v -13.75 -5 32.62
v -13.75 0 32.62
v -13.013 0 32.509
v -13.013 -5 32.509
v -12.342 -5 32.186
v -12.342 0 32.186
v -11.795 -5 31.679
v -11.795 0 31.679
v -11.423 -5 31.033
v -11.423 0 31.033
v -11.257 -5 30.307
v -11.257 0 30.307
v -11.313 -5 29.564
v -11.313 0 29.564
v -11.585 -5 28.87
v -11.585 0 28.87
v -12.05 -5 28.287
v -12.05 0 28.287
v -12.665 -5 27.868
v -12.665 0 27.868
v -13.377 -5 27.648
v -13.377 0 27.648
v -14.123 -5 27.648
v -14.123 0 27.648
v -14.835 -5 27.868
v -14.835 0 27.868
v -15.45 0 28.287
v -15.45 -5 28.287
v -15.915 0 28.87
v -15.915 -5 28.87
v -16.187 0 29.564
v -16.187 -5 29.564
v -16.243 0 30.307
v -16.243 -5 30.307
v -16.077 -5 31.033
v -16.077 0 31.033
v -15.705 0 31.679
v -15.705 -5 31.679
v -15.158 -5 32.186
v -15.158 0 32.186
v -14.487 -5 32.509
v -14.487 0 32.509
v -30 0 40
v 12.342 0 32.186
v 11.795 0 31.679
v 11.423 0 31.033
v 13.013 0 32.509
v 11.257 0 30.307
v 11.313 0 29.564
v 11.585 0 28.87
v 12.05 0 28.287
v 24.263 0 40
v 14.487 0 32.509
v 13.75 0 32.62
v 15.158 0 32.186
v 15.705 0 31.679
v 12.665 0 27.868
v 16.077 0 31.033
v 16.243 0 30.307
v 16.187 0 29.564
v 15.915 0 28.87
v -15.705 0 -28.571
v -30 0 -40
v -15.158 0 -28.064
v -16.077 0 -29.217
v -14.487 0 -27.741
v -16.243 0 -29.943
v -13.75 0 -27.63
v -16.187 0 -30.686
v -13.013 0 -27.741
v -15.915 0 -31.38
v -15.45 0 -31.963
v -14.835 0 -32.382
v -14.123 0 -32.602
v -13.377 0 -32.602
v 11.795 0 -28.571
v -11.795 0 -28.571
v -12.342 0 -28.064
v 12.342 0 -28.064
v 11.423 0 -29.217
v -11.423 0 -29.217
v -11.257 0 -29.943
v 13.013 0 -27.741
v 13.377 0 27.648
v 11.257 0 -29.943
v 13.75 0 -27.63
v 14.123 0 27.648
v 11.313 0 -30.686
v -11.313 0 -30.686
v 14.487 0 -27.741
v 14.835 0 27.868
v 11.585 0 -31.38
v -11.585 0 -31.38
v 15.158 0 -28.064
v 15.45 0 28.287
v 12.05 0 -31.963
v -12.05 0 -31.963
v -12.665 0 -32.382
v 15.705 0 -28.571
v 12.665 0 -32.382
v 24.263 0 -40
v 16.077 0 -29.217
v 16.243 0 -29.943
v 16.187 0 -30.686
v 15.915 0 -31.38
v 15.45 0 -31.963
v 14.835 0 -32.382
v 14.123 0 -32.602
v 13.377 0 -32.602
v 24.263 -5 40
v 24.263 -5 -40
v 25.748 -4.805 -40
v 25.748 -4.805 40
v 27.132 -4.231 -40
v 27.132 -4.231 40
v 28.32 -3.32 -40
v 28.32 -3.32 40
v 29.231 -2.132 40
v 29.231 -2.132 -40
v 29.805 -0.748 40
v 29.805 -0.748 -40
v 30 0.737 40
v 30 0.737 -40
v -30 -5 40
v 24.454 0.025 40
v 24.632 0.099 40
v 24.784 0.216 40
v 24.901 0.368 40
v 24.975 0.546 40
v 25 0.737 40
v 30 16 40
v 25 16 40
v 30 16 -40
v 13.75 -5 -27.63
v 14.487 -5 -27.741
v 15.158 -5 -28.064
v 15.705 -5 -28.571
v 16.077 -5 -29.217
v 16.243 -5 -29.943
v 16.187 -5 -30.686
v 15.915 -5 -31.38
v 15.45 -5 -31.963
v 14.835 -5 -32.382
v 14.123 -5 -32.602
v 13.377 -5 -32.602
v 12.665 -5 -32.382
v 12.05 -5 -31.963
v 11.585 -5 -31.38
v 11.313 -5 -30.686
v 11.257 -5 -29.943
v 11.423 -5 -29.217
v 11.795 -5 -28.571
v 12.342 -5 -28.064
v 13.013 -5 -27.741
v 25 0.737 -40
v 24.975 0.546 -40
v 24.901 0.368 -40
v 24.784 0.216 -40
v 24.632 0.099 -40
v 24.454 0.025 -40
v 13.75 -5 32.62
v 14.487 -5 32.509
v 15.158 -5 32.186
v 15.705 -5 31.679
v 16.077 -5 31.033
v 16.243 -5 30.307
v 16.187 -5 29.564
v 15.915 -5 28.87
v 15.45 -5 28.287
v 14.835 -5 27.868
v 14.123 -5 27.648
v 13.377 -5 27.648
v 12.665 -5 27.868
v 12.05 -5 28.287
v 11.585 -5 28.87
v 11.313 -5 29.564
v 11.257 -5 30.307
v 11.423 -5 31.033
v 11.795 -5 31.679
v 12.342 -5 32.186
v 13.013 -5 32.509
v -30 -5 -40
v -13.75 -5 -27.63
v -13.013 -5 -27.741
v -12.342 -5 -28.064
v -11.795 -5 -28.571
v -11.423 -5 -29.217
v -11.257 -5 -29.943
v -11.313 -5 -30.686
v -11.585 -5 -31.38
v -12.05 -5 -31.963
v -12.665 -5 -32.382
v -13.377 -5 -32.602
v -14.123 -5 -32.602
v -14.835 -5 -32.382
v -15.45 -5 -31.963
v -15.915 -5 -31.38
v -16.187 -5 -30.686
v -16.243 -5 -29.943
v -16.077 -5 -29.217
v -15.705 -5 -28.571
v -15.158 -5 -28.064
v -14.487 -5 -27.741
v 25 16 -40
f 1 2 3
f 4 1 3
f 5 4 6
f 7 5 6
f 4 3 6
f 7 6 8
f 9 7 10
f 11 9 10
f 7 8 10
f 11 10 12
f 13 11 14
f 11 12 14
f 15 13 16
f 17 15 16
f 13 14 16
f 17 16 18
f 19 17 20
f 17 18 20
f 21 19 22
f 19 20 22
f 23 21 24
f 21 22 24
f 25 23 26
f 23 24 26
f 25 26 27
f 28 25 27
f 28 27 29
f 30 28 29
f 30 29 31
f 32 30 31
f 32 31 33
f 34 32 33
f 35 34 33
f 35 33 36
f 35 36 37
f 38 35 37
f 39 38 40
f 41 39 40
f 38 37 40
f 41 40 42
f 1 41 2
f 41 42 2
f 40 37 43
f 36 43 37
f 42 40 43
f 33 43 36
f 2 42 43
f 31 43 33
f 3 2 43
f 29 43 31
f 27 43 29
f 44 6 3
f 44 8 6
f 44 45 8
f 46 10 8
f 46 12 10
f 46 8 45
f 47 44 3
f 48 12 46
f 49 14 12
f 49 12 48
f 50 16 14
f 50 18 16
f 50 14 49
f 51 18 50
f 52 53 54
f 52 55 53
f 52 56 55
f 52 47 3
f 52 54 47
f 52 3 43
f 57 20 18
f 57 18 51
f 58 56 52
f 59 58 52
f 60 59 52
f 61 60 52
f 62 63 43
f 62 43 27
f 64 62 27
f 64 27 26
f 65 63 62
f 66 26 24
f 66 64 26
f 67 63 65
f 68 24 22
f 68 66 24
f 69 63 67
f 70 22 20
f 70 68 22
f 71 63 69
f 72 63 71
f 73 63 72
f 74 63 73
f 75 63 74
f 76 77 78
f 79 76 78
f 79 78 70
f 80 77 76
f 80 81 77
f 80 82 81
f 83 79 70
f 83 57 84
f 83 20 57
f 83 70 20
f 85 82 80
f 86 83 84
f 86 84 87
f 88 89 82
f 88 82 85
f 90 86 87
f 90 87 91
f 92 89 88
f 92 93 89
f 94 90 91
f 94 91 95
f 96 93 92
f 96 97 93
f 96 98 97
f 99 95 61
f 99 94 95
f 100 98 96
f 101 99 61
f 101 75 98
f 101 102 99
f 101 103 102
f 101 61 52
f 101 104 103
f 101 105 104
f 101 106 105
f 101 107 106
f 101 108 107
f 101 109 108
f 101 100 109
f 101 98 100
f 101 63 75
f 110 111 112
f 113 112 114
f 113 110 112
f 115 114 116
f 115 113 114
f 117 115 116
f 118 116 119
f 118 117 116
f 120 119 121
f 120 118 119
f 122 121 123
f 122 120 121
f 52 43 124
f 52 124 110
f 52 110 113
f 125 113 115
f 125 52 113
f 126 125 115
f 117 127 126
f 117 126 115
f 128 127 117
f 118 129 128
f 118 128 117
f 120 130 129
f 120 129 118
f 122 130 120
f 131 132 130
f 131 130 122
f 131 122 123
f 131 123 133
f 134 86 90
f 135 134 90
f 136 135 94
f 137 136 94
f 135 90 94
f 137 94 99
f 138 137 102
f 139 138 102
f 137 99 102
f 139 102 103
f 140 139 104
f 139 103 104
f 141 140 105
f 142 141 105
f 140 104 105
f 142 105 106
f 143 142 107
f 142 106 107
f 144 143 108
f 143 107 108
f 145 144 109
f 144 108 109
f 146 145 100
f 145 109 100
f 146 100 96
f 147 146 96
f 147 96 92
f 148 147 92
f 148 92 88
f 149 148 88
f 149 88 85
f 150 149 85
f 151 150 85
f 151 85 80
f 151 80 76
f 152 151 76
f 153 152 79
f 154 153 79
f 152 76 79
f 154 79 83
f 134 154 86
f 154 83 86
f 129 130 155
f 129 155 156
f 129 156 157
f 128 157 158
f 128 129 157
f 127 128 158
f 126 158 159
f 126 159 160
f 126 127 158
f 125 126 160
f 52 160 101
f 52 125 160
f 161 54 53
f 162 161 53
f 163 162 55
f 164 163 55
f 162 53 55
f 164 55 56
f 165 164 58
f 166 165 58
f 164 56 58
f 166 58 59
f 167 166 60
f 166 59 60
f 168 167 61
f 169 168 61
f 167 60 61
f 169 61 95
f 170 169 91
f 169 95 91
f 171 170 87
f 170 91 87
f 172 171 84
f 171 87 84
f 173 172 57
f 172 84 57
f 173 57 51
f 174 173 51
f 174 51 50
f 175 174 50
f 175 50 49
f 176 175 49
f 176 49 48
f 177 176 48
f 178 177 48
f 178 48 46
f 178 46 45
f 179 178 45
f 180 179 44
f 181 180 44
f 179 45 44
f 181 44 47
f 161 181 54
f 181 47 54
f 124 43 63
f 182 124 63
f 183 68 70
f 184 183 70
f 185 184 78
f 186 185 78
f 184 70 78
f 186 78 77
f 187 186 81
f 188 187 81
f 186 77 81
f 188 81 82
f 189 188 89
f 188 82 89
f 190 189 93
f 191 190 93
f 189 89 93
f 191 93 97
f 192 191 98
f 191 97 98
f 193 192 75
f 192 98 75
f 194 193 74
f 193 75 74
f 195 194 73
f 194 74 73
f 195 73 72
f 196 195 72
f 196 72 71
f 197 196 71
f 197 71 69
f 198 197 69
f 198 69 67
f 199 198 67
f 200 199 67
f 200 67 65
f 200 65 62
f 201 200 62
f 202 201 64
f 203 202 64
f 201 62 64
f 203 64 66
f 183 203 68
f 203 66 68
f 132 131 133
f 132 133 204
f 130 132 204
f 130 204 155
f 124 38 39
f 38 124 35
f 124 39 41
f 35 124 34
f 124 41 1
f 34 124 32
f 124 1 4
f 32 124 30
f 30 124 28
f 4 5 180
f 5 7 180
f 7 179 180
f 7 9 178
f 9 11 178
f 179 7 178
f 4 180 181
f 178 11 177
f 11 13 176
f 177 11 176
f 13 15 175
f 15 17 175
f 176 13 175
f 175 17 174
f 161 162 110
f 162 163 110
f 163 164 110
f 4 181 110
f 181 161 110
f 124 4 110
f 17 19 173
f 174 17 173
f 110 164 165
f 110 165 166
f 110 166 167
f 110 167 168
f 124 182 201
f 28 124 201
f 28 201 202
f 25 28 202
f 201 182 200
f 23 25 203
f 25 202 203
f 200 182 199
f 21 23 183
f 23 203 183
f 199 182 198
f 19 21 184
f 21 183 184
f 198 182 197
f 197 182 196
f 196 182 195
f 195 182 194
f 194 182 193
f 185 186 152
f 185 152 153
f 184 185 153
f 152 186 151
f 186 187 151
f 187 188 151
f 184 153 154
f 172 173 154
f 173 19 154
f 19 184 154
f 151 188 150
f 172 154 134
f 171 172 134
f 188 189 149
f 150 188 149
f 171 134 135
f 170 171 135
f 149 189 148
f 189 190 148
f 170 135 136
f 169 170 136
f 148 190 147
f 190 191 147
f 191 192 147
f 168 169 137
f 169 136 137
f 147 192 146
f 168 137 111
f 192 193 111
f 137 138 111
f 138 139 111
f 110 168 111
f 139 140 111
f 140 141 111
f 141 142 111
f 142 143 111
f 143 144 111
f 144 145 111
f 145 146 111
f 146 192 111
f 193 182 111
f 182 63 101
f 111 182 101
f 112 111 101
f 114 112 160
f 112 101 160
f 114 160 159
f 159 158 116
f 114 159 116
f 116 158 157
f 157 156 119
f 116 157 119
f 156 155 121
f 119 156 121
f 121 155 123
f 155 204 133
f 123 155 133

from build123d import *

# Parameters (mm, degrees)
CROQUIS1_W                       = 60
CROQUIS1_H                       = 80
BRIDA_BASE1_DEPTH                = 5
BRIDA_DE_ARISTA1_STRIP_W         = 21.4732
BRIDA_DE_ARISTA1_STRIP_H         = 5
BRIDA_DE_ARISTA1_STRIP_CUT_DEPTH = 80
BRIDA_DE_ARISTA1_DEPTH           = 80
CROQUIS9_R                       = 2.5
CORTAR_EXTRUIR1_DEPTH            = 5


# Sheet-metal steps are written as plain solids
with BuildPart() as part:
    # Croquis1 → Brida base1 (new body)
    with BuildSketch(Plane(origin=(0, 0, 0), x_dir=(1, 0, 0), z_dir=(0, 1, 0))):
        Rectangle(CROQUIS1_W, CROQUIS1_H)
    extrude(amount=-BRIDA_BASE1_DEPTH)

    # Brida de arista1 strip (across the edge) → Brida de arista1 strip cut (cut)
    with BuildSketch(Plane(origin=(30, 0, 40), x_dir=(-1, 0, 0), z_dir=(0, 0, -1))):
        with Locations((-5, -2.5)):
            Rectangle(BRIDA_DE_ARISTA1_STRIP_W, BRIDA_DE_ARISTA1_STRIP_H)
    extrude(amount=BRIDA_DE_ARISTA1_STRIP_CUT_DEPTH, mode=Mode.SUBTRACT)

    # Brida de arista1 section (across the edge) → Brida de arista1 (add)
    with BuildSketch(Plane(origin=(30, 0, 40), x_dir=(-1, 0, 0), z_dir=(0, 0, -1))):
        with BuildLine():
            Line((0, 0.7366), (0, 16))
            Line((0, 16), (5, 16))
            Line((5, 16), (5, 0.7366))
            ThreePointArc((5, 0.7366), (5.215745145, 0.215745145), (5.7366, 0))
            Line((5.7366, 0), (5.7366, -5))
            ThreePointArc((5.7366, -5), (1.680211239, -3.319788761), (0, 0.7366))
        make_face()
    extrude(amount=BRIDA_DE_ARISTA1_DEPTH)

    # Croquis9 → Cortar-Extruir1 (cut)
    with BuildSketch(Plane(origin=(0, 0, 0), x_dir=(1, 0, 0), z_dir=(0, 1, 0))):
        with Locations(Location((-13.75, 30.13, 0), (0, 0, 270))):
            Circle(CROQUIS9_R)
        with Locations(Location((13.75, 30.13, 0), (0, 0, 270))):
            Circle(CROQUIS9_R)
        with Locations(Location((13.75, -30.12, 0), (0, 0, 270))):
            Circle(CROQUIS9_R)
        with Locations(Location((-13.75, -30.12, 0), (0, 0, 270))):
            Circle(CROQUIS9_R)
    extrude(amount=-CORTAR_EXTRUIR1_DEPTH, mode=Mode.SUBTRACT)


solid = part.part
